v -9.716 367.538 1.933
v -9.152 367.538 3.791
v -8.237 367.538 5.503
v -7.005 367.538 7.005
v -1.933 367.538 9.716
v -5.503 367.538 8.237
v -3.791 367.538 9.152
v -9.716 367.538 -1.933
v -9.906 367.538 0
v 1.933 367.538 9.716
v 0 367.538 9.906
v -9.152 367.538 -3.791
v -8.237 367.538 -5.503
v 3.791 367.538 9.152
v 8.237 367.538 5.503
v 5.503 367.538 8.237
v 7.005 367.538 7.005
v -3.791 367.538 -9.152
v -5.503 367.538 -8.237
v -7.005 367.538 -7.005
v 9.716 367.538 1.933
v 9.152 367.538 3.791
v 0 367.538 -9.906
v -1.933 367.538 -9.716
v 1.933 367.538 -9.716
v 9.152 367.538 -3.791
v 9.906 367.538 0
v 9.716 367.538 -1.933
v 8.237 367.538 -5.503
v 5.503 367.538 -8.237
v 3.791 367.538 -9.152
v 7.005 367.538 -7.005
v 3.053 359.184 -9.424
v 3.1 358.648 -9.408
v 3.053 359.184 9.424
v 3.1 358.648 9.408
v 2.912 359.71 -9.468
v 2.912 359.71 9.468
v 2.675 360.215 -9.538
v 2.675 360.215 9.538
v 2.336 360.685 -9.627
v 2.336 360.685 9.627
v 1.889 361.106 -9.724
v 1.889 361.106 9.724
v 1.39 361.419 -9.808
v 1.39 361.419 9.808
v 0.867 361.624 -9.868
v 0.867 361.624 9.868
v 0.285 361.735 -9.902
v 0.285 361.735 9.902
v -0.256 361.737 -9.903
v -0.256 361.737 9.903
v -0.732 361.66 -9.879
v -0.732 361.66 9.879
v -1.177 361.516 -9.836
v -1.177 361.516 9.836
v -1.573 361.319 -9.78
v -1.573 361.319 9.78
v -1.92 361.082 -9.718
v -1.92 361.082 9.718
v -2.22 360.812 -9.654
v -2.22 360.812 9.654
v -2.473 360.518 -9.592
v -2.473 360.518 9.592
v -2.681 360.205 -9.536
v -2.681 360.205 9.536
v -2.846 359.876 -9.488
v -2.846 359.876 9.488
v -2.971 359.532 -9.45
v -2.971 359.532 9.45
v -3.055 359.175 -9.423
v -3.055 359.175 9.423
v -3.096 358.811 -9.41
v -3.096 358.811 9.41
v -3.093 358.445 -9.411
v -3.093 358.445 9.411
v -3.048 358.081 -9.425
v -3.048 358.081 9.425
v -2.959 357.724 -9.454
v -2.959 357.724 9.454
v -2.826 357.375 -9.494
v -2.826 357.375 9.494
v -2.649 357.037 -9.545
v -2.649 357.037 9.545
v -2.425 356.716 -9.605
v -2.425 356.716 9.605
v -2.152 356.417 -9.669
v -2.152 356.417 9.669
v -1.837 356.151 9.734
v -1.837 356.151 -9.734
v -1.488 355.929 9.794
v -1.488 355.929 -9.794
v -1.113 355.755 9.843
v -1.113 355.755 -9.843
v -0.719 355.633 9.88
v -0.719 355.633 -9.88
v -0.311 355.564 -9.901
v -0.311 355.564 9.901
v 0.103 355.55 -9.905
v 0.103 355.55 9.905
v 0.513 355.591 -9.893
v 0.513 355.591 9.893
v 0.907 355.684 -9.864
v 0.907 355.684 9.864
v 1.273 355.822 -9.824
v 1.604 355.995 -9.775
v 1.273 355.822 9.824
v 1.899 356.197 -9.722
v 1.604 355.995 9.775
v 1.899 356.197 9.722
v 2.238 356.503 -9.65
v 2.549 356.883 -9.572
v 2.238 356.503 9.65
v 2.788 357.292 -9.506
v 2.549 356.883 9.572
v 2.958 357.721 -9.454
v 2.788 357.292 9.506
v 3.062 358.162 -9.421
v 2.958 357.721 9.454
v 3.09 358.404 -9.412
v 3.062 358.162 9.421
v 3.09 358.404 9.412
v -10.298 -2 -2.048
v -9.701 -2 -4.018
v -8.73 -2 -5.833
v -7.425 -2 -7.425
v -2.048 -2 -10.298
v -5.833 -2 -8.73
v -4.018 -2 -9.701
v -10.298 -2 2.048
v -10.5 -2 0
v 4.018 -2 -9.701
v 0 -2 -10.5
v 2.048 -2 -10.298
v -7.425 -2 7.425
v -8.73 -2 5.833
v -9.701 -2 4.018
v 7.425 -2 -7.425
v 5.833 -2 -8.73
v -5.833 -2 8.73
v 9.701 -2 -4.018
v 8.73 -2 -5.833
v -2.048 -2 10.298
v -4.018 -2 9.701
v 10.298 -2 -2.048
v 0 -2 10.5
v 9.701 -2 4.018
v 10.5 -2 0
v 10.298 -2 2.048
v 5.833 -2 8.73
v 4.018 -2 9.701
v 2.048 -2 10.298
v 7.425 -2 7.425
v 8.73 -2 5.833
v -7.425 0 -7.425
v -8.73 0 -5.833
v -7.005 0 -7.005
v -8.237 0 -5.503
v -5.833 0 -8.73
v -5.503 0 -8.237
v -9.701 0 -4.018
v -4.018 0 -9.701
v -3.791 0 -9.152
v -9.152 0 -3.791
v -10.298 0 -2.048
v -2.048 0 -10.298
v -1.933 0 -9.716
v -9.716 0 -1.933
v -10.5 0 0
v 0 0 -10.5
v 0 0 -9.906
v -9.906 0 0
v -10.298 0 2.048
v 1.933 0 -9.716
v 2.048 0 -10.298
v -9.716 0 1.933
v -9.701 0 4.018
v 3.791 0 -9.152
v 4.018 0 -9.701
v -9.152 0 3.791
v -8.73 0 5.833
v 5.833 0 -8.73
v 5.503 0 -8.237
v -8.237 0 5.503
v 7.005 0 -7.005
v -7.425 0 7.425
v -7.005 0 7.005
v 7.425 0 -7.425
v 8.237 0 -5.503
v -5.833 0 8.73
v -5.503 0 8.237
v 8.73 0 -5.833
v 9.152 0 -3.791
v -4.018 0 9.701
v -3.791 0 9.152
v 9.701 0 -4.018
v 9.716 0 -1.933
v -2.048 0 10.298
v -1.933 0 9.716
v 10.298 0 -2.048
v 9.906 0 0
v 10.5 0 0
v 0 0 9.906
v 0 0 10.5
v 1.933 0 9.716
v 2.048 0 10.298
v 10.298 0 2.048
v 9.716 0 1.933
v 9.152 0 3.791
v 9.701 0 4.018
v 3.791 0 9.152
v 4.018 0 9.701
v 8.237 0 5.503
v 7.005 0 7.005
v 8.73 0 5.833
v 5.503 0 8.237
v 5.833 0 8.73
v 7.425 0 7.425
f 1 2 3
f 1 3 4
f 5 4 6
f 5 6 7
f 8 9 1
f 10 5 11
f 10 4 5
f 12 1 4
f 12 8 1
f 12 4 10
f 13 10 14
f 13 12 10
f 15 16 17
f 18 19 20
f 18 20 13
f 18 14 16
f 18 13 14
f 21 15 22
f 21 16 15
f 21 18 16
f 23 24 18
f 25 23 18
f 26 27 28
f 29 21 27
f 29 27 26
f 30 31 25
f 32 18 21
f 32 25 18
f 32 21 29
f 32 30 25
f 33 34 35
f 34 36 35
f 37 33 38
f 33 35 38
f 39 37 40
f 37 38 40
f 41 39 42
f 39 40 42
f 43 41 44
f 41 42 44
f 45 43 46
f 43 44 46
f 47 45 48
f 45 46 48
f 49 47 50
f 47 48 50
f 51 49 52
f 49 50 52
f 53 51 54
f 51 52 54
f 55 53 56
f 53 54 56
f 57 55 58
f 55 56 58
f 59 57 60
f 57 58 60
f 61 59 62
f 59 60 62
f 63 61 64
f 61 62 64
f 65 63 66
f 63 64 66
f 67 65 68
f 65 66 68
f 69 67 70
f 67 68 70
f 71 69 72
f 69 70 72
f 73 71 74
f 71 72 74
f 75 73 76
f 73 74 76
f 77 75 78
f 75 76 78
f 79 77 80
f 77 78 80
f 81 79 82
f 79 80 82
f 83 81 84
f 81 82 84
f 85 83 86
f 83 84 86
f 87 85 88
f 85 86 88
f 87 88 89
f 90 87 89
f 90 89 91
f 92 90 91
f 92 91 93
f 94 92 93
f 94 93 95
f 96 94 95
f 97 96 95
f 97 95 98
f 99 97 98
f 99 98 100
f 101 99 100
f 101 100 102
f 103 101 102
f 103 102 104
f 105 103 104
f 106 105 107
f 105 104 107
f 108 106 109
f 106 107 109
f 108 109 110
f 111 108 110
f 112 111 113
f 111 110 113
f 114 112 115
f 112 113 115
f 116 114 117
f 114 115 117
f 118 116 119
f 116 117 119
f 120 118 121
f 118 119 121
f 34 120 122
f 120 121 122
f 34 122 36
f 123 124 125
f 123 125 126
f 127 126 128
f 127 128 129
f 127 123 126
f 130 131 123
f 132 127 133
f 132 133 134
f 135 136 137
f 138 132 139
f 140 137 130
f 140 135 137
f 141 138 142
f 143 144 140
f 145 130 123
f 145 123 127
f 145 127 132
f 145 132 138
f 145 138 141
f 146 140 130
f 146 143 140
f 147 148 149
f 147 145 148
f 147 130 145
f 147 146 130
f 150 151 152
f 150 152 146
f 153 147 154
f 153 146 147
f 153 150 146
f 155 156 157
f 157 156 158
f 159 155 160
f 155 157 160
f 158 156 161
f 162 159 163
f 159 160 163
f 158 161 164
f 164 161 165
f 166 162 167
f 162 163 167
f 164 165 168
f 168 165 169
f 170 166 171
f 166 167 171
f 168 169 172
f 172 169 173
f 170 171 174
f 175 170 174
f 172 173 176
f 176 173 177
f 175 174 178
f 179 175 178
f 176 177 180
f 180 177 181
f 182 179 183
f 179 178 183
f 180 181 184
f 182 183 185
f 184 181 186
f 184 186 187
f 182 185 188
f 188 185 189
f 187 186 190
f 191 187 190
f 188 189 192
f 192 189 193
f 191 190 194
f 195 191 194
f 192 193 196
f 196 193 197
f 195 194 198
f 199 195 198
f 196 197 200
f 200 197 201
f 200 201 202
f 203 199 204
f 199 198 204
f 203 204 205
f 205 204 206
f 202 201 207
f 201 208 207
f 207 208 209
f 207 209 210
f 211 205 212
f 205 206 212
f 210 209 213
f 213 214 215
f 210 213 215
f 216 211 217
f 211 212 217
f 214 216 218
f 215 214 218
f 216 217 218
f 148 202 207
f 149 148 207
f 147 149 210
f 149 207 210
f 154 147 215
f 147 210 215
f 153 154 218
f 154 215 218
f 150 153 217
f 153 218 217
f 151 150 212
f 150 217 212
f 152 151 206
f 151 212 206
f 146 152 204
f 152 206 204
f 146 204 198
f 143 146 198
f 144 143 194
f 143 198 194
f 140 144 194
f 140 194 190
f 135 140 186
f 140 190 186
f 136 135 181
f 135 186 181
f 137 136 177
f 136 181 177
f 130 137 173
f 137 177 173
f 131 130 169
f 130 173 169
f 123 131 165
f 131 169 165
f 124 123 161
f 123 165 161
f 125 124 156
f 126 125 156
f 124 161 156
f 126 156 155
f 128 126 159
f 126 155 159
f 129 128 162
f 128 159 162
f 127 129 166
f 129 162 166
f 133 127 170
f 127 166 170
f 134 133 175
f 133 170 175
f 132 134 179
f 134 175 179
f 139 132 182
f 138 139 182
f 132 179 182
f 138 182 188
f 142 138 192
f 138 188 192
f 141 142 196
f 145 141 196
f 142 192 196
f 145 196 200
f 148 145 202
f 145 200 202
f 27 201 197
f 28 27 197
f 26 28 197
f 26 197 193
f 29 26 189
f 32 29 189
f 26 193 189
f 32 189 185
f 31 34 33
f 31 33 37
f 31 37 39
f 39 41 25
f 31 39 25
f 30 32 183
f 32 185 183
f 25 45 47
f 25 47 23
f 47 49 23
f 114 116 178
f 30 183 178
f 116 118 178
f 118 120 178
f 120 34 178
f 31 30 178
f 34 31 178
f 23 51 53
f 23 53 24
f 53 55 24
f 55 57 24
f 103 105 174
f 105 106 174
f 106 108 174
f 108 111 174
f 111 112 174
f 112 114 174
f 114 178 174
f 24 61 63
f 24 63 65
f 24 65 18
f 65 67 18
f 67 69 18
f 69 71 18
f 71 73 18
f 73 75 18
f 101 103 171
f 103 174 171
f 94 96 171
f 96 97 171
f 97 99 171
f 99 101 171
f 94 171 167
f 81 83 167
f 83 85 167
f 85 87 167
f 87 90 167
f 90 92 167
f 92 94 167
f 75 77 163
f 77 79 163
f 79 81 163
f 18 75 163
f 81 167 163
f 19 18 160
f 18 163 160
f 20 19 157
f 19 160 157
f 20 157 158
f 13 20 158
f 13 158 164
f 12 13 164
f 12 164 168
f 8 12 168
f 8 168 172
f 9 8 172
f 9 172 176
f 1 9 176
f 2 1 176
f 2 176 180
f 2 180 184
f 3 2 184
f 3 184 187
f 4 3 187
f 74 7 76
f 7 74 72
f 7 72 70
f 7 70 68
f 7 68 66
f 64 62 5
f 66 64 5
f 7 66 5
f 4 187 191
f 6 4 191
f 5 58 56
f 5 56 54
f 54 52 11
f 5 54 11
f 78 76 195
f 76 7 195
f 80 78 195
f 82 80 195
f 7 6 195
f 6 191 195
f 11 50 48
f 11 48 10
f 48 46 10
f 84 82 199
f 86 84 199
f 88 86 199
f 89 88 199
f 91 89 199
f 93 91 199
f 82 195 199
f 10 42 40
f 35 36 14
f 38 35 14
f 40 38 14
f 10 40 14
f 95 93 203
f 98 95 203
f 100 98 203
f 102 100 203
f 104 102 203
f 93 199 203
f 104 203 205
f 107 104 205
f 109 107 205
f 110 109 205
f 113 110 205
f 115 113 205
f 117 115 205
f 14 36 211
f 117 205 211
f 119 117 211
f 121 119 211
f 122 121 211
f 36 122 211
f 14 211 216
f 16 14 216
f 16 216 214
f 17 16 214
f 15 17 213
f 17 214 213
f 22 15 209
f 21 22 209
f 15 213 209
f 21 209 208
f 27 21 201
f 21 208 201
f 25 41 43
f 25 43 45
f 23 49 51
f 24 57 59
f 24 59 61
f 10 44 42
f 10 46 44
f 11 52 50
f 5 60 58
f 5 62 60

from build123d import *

# Parameters (mm, degrees)
CROQUIS1_R              = 9.906
SALIENTE_EXTRUIR1_DEPTH = 367.538
CROQUIS2_R              = 3.1
CORTAR_EXTRUIR1_DEPTH   = 10
CROQUIS3_R              = 10.5
SALIENTE_EXTRUIR2_DEPTH = 2


with BuildPart() as part:
    # Croquis1 → Saliente-Extruir1 (new body)
    with BuildSketch(Plane(origin=(0, 0, 0), x_dir=(1, 0, 0), z_dir=(0, 1, 0))):
        Circle(CROQUIS1_R)
    extrude(amount=SALIENTE_EXTRUIR1_DEPTH)

    # Croquis2 → Cortar-Extruir1 (cut, symmetric)
    with BuildSketch(Plane.XY):
        with Locations((0, 358.648)):
            Circle(CROQUIS2_R)
    extrude(amount=CORTAR_EXTRUIR1_DEPTH, both=True, mode=Mode.SUBTRACT)

    # Croquis3 → Saliente-Extruir2 (add)
    with BuildSketch(Plane.XZ):
        Circle(CROQUIS3_R)
    extrude(amount=SALIENTE_EXTRUIR2_DEPTH)


solid = part.part
